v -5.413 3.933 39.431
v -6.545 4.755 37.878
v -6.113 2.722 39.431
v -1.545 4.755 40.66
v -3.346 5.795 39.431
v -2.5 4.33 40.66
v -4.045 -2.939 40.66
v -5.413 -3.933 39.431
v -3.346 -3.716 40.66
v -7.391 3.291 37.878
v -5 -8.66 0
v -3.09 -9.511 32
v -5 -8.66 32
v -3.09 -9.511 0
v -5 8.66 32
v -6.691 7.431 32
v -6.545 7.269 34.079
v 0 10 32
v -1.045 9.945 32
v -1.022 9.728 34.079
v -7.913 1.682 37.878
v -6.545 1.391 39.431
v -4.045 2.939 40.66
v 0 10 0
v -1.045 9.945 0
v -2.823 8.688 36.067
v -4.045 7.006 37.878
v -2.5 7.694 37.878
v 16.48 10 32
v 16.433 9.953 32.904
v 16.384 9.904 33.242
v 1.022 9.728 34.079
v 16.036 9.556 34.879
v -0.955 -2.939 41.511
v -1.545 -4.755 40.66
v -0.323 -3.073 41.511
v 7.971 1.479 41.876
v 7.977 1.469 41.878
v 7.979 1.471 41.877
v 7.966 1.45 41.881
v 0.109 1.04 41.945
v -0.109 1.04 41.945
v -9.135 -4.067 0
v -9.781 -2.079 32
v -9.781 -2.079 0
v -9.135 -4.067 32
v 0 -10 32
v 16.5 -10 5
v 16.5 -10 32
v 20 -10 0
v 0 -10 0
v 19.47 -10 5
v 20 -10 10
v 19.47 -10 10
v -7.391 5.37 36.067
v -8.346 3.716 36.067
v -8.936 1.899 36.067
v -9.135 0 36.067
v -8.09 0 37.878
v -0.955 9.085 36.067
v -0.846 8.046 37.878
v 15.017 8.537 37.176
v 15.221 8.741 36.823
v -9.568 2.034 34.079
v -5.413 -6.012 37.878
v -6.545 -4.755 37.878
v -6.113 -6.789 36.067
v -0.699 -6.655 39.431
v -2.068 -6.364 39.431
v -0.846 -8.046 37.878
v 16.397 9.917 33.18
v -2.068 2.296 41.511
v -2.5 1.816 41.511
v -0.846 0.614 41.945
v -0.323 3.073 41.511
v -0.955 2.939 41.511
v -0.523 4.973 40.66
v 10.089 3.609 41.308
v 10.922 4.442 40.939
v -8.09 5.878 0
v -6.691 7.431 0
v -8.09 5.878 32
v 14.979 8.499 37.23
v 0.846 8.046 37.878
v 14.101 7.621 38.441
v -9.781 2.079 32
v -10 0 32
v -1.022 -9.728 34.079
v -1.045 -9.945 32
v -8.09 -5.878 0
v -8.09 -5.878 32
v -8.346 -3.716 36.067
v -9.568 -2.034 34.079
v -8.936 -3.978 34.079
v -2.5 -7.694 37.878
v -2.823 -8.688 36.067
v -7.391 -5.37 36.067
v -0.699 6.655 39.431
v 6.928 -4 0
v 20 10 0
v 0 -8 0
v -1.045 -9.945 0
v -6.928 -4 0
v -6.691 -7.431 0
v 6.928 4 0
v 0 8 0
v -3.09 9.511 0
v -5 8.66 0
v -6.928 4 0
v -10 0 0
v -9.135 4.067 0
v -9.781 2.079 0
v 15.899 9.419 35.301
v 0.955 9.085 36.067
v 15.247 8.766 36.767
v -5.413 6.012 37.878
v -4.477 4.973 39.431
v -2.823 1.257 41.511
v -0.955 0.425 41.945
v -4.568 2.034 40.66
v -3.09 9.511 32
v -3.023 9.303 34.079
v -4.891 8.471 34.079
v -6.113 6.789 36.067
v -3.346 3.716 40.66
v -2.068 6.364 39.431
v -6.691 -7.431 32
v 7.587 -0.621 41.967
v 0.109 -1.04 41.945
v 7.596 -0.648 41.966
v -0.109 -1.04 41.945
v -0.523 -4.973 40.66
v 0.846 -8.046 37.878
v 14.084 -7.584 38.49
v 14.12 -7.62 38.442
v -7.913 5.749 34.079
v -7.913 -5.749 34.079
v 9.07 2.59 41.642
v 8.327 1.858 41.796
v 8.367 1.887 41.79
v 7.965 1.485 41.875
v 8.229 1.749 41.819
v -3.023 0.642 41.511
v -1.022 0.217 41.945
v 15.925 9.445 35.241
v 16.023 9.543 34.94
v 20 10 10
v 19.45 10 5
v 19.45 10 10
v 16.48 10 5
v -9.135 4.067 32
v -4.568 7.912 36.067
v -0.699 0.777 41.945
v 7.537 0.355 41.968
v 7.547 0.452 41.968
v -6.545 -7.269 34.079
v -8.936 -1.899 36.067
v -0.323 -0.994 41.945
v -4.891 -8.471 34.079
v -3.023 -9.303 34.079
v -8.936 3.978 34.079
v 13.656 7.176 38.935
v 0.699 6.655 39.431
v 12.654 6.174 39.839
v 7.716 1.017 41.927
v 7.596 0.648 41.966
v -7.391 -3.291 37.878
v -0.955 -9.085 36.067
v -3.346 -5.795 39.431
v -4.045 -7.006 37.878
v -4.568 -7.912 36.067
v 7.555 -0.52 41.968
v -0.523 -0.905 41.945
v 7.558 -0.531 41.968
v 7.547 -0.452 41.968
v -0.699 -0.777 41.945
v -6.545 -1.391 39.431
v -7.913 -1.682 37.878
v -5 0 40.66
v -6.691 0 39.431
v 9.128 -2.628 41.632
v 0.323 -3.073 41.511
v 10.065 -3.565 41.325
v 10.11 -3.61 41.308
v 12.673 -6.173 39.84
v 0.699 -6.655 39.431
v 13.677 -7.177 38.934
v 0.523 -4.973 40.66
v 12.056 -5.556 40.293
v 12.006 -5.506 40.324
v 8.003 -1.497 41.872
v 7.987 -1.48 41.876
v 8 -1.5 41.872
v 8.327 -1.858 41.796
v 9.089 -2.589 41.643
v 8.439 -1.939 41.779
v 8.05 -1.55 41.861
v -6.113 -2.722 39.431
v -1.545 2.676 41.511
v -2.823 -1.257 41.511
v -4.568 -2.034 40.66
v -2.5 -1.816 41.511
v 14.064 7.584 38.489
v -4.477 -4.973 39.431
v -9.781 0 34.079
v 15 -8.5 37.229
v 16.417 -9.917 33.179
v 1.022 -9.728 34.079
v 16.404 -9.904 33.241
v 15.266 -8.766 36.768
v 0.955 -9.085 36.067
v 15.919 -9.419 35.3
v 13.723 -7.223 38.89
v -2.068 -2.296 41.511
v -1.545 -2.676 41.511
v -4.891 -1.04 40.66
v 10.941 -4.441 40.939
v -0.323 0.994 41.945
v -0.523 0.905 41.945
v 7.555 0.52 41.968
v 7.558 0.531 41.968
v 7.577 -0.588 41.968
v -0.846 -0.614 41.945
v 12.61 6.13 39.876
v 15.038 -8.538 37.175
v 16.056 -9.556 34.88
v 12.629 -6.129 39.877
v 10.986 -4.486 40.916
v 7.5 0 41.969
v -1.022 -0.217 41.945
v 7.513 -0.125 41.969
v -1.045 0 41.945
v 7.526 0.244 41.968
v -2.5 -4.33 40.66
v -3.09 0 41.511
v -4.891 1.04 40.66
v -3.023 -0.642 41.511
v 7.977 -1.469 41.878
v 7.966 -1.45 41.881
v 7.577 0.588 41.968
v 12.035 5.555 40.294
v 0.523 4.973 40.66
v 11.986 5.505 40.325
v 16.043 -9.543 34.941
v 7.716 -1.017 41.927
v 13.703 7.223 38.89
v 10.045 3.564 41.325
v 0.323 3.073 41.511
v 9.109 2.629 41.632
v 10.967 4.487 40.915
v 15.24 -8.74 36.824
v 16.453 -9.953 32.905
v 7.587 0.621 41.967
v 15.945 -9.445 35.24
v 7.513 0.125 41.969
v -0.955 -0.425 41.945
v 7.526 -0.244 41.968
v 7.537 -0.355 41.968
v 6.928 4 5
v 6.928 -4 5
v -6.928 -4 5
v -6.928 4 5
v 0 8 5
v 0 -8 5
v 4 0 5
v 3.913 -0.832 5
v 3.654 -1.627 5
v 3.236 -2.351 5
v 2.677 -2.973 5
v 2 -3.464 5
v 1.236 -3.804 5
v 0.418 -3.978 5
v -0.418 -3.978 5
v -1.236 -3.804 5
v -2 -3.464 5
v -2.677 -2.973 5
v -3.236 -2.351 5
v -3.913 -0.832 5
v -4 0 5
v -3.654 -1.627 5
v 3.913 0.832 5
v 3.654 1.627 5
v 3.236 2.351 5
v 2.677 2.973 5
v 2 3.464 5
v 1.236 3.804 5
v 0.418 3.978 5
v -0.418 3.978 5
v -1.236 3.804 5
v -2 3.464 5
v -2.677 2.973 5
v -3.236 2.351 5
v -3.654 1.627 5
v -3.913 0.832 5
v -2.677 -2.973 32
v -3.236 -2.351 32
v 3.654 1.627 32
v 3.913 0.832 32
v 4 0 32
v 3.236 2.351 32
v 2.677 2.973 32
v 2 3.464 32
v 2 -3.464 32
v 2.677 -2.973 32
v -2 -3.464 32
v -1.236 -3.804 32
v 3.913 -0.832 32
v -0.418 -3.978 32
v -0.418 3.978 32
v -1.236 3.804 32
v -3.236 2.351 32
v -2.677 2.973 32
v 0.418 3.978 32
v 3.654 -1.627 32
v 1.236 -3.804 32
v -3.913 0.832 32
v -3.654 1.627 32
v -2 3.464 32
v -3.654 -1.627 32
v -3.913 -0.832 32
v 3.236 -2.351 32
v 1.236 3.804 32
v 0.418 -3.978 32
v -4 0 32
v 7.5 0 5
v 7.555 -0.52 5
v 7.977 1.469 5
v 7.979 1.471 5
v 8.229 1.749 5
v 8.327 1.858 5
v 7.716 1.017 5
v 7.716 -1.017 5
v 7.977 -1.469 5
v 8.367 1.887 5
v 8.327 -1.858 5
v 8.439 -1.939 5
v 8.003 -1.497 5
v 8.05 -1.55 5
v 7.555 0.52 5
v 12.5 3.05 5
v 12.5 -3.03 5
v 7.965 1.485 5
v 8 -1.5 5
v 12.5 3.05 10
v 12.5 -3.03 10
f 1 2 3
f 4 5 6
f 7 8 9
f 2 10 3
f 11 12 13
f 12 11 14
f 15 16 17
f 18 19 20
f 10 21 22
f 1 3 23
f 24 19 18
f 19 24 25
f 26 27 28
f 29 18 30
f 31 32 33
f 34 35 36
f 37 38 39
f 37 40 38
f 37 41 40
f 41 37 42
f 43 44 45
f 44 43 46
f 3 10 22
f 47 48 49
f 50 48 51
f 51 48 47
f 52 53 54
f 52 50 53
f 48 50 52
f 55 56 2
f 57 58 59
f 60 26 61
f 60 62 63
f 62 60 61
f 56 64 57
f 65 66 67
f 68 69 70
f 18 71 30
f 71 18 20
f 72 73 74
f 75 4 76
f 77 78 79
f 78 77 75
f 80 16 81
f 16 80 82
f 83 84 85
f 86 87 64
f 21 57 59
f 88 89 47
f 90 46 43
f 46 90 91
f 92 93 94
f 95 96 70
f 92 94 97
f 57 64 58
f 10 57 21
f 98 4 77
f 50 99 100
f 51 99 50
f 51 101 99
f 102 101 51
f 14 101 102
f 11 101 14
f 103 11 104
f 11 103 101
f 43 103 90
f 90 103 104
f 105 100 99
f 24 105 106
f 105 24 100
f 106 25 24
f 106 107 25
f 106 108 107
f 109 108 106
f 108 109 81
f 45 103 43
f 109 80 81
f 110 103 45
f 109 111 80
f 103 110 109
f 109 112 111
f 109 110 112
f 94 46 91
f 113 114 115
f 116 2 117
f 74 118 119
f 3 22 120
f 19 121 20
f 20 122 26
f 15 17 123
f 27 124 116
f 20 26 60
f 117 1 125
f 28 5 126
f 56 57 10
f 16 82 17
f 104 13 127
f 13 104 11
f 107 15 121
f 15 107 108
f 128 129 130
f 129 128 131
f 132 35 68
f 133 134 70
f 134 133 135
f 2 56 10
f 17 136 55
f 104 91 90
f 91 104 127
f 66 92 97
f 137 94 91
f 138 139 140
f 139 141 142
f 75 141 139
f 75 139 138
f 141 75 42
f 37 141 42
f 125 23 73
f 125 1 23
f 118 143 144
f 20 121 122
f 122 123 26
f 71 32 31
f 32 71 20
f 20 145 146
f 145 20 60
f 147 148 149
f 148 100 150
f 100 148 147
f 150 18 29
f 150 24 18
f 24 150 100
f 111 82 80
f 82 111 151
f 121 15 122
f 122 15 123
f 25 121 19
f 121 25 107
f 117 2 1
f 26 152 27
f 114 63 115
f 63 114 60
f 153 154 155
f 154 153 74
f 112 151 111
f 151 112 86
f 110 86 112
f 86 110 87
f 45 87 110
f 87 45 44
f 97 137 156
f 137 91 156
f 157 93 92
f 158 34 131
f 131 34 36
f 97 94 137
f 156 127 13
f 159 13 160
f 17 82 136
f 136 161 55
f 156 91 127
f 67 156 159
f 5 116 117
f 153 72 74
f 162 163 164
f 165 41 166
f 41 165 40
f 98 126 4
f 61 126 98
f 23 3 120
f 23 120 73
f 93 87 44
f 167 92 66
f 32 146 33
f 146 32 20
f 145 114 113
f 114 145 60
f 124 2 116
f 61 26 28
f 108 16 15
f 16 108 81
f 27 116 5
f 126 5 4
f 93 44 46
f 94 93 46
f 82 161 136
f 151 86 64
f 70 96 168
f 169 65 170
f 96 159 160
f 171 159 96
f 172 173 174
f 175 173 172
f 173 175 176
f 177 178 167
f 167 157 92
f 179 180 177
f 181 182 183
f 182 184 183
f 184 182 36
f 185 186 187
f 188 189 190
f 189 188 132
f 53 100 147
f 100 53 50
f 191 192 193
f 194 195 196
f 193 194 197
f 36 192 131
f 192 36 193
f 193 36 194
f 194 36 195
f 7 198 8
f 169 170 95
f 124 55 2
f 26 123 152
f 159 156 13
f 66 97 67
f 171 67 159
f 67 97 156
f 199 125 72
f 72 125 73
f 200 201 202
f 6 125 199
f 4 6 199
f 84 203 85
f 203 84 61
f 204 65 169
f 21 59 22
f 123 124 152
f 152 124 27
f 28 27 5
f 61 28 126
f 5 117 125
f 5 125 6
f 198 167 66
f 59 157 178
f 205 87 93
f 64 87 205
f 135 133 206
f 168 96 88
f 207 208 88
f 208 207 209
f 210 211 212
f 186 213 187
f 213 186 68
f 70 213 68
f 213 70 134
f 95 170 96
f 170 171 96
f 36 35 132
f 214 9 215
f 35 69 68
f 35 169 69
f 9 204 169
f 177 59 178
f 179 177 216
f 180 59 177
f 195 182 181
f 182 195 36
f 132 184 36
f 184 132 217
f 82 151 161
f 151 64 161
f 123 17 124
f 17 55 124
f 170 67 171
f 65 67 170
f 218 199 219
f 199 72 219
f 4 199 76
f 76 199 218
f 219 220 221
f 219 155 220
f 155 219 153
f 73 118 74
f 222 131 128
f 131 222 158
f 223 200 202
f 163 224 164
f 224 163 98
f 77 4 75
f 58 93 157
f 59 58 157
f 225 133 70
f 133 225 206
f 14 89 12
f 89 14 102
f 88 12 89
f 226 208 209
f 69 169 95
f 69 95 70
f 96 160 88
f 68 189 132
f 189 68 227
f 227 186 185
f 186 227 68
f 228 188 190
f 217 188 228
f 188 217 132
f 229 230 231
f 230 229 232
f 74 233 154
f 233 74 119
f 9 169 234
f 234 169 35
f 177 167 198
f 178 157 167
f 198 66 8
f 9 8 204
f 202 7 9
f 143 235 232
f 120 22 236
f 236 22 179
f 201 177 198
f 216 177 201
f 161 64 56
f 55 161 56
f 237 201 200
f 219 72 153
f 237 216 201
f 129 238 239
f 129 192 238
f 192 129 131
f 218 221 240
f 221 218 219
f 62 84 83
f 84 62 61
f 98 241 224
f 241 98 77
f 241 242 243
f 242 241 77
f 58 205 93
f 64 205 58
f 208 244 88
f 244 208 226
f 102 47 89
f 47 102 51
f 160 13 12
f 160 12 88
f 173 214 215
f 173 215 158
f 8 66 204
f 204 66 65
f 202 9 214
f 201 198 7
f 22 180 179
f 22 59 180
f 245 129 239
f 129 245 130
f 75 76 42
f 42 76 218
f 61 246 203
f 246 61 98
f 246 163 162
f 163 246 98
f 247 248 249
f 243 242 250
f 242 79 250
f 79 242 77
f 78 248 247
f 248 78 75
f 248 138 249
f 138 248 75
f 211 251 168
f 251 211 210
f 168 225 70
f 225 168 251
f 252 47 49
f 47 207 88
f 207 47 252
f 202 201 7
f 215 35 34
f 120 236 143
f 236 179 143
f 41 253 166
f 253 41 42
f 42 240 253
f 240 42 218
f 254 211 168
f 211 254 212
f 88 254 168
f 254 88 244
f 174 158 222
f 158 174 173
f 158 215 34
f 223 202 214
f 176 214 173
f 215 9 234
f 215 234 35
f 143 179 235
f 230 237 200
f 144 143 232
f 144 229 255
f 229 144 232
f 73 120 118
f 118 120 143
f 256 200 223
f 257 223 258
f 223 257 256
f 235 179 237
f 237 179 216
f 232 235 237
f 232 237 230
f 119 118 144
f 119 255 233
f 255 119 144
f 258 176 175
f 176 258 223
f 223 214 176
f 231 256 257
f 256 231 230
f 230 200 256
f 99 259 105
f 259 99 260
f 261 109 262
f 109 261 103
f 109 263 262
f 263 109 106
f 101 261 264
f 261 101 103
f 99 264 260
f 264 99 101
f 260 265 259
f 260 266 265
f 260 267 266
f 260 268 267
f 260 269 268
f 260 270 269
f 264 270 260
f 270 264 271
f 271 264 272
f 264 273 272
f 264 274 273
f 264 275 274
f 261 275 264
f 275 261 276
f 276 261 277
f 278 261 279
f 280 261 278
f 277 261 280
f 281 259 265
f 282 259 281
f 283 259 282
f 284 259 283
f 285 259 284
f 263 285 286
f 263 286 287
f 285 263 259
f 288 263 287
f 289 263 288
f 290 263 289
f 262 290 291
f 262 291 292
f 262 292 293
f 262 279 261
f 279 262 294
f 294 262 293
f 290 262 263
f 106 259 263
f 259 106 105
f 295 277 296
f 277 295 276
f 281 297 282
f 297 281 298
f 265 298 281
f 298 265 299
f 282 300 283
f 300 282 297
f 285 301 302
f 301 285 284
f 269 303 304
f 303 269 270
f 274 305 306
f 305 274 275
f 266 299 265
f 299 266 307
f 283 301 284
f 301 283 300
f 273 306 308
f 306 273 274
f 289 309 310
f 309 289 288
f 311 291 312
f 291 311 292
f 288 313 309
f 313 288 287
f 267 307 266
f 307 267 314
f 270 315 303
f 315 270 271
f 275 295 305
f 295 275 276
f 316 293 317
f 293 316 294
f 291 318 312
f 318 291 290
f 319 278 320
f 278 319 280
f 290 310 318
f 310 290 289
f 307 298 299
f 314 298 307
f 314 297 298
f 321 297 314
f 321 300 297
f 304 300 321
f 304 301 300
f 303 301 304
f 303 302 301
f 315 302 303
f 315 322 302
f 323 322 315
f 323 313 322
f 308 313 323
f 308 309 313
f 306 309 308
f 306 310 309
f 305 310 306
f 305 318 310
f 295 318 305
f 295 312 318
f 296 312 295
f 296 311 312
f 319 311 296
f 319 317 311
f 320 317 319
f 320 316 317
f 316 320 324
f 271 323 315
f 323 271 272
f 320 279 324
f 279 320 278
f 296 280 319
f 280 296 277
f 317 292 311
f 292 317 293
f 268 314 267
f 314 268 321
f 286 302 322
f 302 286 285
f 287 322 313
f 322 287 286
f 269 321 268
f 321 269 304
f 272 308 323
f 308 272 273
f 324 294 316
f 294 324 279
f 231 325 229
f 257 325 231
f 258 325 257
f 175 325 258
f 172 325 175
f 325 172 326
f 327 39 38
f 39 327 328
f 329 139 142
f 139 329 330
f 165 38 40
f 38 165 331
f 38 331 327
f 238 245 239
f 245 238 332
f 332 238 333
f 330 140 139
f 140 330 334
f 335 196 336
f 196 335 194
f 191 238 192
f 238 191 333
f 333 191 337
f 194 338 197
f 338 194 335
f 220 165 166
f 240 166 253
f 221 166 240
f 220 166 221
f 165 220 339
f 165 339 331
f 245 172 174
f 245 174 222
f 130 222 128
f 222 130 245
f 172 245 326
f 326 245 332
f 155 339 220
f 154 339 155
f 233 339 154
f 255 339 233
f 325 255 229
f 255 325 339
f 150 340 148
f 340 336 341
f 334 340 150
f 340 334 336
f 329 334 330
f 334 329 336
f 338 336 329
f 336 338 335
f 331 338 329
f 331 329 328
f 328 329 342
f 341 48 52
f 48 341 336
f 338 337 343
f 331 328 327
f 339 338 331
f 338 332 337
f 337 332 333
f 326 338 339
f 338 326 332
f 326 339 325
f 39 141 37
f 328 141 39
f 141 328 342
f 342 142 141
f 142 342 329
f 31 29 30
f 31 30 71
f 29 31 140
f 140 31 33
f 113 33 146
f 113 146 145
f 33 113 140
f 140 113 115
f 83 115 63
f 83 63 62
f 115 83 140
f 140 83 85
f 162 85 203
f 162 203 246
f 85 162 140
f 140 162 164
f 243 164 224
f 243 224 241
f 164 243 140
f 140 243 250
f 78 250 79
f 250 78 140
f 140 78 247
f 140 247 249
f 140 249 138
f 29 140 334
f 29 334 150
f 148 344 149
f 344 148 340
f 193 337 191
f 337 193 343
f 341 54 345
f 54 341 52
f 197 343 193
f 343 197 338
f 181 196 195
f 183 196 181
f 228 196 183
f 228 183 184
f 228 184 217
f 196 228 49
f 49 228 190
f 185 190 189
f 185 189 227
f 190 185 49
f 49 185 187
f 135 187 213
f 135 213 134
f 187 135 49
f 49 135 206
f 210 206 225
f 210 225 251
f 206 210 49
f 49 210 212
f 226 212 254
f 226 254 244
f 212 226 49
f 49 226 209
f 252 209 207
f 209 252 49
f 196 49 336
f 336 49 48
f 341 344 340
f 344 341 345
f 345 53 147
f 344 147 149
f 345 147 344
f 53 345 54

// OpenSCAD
difference() {
    hull() {
        cylinder(r=10, h=32, $fn=30);
        translate([0,0,32]) sphere(r=10);
        translate([0,-10,0]) cube([20,20,32]);
        translate([19,0,32]) rotate([0,90,0]) cylinder(r=10);
    }
    translate([0,0,-1]) rotate([0,0,90]) cylinder(r=8, h=6, $fn=6);
    cylinder(r=4, h=32, $fn=30);
    translate([10,0,5]) cylinder(r=2.5, h=42, $fn=30);
    translate([9.45,0,5]) rotate([0,0,45]) cube([20,2.1,37]);
    translate([8,-1.5,5]) rotate([0,0,-45]) cube([20,2.1,37]);
    translate([10.5,-4,5]) cube([2,8,5]);
    translate([9,0,10]) rotate([0,0,-45]) cube([15,15,32]);
}
